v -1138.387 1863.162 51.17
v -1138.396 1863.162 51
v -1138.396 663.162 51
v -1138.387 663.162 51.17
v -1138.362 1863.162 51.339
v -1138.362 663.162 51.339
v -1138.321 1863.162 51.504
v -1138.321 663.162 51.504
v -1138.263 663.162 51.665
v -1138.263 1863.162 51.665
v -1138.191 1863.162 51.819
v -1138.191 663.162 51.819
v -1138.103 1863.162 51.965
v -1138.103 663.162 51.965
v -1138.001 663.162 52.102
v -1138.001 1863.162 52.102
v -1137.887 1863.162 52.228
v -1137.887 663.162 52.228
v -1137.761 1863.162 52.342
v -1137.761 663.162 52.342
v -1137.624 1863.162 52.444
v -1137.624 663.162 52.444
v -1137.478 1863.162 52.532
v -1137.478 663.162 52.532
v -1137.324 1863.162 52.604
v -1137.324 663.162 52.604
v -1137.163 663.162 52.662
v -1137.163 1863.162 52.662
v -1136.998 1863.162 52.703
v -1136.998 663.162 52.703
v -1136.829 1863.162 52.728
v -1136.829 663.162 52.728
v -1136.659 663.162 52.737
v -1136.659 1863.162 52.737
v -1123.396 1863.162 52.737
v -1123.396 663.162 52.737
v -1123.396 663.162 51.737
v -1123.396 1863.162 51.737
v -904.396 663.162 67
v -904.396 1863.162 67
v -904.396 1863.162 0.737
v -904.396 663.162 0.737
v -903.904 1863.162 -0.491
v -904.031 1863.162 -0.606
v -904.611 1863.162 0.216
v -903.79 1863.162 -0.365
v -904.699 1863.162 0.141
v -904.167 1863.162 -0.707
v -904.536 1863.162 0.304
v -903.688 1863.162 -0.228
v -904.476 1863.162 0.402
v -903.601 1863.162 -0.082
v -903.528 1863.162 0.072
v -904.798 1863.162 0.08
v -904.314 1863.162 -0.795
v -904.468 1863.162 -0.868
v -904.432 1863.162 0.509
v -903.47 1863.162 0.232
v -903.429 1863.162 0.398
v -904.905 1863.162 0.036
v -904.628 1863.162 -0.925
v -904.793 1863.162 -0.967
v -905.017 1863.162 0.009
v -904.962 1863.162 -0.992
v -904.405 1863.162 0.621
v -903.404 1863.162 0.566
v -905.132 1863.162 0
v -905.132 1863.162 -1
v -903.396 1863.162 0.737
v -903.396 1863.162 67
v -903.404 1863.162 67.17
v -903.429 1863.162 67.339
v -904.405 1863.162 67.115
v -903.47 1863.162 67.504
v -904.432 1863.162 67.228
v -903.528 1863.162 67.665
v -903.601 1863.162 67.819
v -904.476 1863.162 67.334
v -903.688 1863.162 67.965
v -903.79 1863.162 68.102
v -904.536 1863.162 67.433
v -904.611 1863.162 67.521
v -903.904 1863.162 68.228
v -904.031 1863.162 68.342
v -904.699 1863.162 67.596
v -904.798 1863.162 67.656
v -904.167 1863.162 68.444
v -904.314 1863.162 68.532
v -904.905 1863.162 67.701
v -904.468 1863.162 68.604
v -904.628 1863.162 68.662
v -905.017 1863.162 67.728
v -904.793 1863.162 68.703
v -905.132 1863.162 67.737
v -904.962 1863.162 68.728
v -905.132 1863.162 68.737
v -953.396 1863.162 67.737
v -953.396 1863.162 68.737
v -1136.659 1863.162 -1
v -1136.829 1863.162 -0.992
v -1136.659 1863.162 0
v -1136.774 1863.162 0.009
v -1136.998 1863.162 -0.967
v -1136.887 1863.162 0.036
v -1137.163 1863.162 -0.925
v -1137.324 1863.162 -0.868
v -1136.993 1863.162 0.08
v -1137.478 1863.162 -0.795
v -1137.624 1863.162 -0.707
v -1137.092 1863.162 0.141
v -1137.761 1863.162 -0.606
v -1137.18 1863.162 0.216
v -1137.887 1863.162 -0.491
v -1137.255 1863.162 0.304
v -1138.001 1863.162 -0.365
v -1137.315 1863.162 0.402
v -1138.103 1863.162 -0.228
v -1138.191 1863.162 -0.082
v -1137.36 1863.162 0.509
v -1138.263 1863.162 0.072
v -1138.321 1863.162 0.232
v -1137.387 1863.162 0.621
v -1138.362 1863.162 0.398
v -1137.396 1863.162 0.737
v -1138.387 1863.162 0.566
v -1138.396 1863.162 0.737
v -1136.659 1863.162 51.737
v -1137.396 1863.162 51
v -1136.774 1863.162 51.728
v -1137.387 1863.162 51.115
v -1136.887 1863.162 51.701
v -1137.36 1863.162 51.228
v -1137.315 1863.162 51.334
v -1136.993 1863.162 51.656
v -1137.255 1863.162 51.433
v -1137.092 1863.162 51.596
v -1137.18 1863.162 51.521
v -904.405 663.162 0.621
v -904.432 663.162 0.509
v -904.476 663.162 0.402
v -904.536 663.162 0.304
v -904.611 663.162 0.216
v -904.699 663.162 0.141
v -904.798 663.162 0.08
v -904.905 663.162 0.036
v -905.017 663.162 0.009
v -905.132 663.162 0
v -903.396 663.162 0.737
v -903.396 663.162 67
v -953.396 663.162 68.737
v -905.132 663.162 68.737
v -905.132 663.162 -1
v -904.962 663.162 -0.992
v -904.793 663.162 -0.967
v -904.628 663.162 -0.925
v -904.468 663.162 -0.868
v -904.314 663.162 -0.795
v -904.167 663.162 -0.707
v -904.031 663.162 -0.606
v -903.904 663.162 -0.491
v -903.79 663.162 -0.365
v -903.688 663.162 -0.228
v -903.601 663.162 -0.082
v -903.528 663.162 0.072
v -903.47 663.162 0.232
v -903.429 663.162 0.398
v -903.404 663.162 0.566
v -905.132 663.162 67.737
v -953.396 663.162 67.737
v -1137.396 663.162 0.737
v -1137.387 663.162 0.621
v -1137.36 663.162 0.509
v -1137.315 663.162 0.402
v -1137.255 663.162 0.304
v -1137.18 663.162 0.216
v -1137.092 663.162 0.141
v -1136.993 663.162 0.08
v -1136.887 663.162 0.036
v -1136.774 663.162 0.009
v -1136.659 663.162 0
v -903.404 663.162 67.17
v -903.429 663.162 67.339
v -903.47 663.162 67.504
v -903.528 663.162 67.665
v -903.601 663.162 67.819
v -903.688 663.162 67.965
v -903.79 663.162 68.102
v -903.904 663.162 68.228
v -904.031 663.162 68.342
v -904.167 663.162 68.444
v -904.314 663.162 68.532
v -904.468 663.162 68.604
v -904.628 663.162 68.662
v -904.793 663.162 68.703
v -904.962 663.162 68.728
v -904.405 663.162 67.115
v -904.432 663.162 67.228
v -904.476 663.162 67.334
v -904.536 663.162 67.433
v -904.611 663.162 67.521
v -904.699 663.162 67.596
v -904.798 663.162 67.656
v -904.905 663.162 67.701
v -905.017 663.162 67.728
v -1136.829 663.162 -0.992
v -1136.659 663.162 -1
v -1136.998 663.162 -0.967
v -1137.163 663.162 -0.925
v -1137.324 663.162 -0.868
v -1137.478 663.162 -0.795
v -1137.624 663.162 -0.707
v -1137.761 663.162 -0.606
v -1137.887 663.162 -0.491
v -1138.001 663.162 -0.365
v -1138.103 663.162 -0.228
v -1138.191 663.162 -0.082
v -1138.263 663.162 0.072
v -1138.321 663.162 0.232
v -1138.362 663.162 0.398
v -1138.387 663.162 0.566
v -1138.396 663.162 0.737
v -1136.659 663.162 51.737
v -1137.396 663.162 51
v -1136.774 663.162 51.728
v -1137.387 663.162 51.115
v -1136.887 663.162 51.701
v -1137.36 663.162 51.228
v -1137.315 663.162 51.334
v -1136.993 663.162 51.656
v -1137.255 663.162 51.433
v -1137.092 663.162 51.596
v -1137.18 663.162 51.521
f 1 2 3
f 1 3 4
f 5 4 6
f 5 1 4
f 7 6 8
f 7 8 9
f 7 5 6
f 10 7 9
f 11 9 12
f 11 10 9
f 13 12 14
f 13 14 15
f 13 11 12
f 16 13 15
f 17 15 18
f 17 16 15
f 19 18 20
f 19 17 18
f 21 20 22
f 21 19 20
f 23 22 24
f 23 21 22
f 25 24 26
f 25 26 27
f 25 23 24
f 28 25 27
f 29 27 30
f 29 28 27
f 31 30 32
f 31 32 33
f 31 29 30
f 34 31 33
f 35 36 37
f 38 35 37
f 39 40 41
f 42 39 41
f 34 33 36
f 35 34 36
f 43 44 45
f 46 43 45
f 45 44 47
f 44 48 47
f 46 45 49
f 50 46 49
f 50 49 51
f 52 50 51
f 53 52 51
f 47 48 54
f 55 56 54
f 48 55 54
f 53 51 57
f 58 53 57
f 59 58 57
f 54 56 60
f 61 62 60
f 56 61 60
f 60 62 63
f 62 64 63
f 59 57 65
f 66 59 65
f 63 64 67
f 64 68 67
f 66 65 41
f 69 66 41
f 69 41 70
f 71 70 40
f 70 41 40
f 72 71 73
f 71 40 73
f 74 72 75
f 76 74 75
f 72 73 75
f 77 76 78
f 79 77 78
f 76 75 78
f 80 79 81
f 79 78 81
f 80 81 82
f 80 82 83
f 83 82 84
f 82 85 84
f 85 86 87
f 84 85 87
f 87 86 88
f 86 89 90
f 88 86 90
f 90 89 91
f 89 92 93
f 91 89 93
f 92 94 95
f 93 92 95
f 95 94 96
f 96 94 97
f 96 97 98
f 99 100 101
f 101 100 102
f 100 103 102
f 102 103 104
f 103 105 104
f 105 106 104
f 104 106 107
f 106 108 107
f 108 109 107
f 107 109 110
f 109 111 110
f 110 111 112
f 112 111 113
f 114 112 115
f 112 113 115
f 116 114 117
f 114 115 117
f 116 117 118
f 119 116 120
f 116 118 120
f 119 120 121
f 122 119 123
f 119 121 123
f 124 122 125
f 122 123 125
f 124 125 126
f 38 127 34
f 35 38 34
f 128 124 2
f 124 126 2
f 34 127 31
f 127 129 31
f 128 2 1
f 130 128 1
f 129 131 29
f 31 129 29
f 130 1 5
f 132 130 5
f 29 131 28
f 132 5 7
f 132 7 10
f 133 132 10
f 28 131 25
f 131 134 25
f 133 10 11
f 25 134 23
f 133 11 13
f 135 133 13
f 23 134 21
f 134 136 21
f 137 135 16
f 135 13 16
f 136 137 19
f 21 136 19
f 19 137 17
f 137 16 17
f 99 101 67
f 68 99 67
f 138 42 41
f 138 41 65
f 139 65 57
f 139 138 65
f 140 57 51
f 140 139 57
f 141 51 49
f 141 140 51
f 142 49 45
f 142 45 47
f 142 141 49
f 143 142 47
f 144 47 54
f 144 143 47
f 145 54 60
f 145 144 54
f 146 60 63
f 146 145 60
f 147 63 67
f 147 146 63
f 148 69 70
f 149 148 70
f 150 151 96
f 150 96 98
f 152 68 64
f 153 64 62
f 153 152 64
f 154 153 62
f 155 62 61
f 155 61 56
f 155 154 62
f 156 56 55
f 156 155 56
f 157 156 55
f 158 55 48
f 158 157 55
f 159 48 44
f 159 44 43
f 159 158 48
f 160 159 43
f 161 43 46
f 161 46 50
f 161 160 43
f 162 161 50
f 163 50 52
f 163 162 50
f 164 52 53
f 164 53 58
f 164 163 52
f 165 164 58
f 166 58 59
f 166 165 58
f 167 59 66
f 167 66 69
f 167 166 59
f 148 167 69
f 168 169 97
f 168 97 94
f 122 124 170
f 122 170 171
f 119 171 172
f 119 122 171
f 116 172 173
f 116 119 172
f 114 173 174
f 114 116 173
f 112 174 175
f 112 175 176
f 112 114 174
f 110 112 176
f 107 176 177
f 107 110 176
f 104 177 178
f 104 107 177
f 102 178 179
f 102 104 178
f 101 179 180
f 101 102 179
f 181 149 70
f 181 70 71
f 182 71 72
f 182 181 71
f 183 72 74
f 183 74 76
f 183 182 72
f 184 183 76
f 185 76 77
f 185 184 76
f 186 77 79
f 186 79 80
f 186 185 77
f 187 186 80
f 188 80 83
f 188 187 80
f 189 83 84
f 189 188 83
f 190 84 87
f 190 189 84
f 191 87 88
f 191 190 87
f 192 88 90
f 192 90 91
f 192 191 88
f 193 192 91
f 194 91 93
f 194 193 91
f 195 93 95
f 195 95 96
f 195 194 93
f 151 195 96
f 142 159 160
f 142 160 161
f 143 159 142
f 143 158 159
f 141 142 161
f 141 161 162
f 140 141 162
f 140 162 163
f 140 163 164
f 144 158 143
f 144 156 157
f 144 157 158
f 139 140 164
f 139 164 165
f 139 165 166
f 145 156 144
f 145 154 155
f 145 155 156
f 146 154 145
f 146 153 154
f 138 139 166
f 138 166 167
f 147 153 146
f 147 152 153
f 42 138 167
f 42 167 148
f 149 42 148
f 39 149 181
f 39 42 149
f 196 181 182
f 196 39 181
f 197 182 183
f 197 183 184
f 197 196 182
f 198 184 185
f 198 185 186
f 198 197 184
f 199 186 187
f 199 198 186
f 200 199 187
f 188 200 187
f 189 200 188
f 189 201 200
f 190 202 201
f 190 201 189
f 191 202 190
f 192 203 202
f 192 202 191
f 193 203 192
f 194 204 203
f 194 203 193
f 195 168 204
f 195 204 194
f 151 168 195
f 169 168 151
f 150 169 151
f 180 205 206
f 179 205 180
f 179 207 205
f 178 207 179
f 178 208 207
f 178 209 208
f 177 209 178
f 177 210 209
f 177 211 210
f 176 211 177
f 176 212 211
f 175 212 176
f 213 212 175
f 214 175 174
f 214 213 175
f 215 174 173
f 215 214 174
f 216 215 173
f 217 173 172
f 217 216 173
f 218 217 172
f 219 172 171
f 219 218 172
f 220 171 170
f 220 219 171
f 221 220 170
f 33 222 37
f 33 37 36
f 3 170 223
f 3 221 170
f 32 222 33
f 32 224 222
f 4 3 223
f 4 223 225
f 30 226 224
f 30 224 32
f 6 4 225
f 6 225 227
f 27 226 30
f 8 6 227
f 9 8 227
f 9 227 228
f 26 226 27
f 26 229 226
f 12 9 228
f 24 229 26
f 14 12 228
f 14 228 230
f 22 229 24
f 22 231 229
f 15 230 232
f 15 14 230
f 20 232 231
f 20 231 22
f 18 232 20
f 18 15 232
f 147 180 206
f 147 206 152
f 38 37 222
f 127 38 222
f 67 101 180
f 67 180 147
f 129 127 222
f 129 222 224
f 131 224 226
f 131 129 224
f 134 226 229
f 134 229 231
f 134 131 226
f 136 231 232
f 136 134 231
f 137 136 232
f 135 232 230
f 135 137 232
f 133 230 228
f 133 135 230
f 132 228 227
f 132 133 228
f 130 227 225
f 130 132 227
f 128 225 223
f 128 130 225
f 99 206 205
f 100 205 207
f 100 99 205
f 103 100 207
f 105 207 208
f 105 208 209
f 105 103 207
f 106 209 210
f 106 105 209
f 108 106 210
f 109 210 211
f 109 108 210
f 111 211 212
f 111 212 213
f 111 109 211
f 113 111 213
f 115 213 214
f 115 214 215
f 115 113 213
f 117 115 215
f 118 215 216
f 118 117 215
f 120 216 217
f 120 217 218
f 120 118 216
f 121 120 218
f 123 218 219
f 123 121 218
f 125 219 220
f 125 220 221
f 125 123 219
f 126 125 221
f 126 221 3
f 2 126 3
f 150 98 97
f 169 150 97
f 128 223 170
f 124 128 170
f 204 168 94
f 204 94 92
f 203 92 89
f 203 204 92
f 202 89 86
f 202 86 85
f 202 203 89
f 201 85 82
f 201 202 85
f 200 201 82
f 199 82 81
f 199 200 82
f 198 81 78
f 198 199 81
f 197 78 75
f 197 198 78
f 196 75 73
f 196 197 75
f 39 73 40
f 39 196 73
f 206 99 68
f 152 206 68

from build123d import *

# Parameters (mm, degrees)
SKETCH1_W                    = 235
SKETCH1_H                    = 1200
BASE_FLANGE1_DEPTH           = 1
EDGE_FLANGE2_STRIP_W         = 5.4732
EDGE_FLANGE2_STRIP_H         = 1
EDGE_FLANGE2_STRIP_CUT_DEPTH = 1200
EDGE_FLANGE2_DEPTH           = 1200
EDGE_FLANGE3_DEPTH           = 1200
EDGE_FLANGE4_STRIP_W         = 5.4732
EDGE_FLANGE4_STRIP_H         = 1
EDGE_FLANGE4_STRIP_CUT_DEPTH = 1200
EDGE_FLANGE4_DEPTH           = 1200
EDGE_FLANGE5_DEPTH           = 1200


# Sheet-metal steps are written as plain solids
with BuildPart() as part:
    # Sketch1 → Base-Flange1 (new body)
    with BuildSketch(Plane.XY):
        with Locations((-1020.895638629, 1263.161993769)):
            Rectangle(SKETCH1_W, SKETCH1_H)
    extrude(amount=-BASE_FLANGE1_DEPTH)

    # Edge-Flange2 strip (across the edge) → Edge-Flange2 strip cut (cut)
    with BuildSketch(Plane(origin=(-1138.395638629, 1863.161993769, 0), x_dir=(1, 0, 0), z_dir=(0, -1, 0))):
        with Locations((-1, -0.5)):
            Rectangle(EDGE_FLANGE2_STRIP_W, EDGE_FLANGE2_STRIP_H)
    extrude(amount=EDGE_FLANGE2_STRIP_CUT_DEPTH, mode=Mode.SUBTRACT)

    # Edge-Flange2 section (across the edge) → Edge-Flange2 (add)
    with BuildSketch(Plane(origin=(-1138.395638629, 1863.161993769, 0), x_dir=(1, 0, 0), z_dir=(0, -1, 0))):
        with BuildLine():
            Line((0, 0.7366), (0, 51))
            Line((0, 51), (1, 51))
            Line((1, 51), (1, 0.7366))
            ThreePointArc((1, 0.7366), (1.215745145, 0.215745145), (1.7366, 0))
            Line((1.7366, 0), (1.7366, -1))
            ThreePointArc((1.7366, -1), (0.508638364, -0.491361636), (0, 0.7366))
        make_face()
    extrude(amount=EDGE_FLANGE2_DEPTH)

    # Edge-Flange3 section (across the edge) → Edge-Flange3 (add)
    with BuildSketch(Plane(origin=(-1137.395638629, 1863.161993769, 51.7366), x_dir=(0, 0, -1), z_dir=(0, -1, 0))):
        with BuildLine():
            Line((-1, 0.7366), (-1, 14))
            Line((-1, 14), (0, 14))
            Line((0, 14), (0, 0.7366))
            ThreePointArc((0, 0.7366), (0.215745145, 0.215745145), (0.7366, 0))
            Line((0.7366, 0), (0.7366, -1))
            ThreePointArc((0.7366, -1), (-0.491361636, -0.491361636), (-1, 0.7366))
        make_face()
    extrude(amount=EDGE_FLANGE3_DEPTH)

    # Edge-Flange4 strip (across the edge) → Edge-Flange4 strip cut (cut)
    with BuildSketch(Plane(origin=(-903.395638629, 663.161993769, 0), x_dir=(-1, 0, 0), z_dir=(0, 1, 0))):
        with Locations((-1, -0.5)):
            Rectangle(EDGE_FLANGE4_STRIP_W, EDGE_FLANGE4_STRIP_H)
    extrude(amount=EDGE_FLANGE4_STRIP_CUT_DEPTH, mode=Mode.SUBTRACT)

    # Edge-Flange4 section (across the edge) → Edge-Flange4 (add)
    with BuildSketch(Plane(origin=(-903.395638629, 663.161993769, 0), x_dir=(-1, 0, 0), z_dir=(0, 1, 0))):
        with BuildLine():
            Line((0, 0.7366), (0, 67))
            Line((0, 67), (1, 67))
            Line((1, 67), (1, 0.7366))
            ThreePointArc((1, 0.7366), (1.215745145, 0.215745145), (1.7366, 0))
            Line((1.7366, 0), (1.7366, -1))
            ThreePointArc((1.7366, -1), (0.508638364, -0.491361636), (0, 0.7366))
        make_face()
    extrude(amount=EDGE_FLANGE4_DEPTH)

    # Edge-Flange5 section (across the edge) → Edge-Flange5 (add)
    with BuildSketch(Plane(origin=(-904.395638629, 663.161993769, 67.7366), x_dir=(0, 0, -1), z_dir=(0, 1, 0))):
        with BuildLine():
            Line((-1, 0.7366), (-1, 49))
            Line((-1, 49), (0, 49))
            Line((0, 49), (0, 0.7366))
            ThreePointArc((0, 0.7366), (0.215745145, 0.215745145), (0.7366, 0))
            Line((0.7366, 0), (0.7366, -1))
            ThreePointArc((0.7366, -1), (-0.491361636, -0.491361636), (-1, 0.7366))
        make_face()
    extrude(amount=EDGE_FLANGE5_DEPTH)


solid = part.part
